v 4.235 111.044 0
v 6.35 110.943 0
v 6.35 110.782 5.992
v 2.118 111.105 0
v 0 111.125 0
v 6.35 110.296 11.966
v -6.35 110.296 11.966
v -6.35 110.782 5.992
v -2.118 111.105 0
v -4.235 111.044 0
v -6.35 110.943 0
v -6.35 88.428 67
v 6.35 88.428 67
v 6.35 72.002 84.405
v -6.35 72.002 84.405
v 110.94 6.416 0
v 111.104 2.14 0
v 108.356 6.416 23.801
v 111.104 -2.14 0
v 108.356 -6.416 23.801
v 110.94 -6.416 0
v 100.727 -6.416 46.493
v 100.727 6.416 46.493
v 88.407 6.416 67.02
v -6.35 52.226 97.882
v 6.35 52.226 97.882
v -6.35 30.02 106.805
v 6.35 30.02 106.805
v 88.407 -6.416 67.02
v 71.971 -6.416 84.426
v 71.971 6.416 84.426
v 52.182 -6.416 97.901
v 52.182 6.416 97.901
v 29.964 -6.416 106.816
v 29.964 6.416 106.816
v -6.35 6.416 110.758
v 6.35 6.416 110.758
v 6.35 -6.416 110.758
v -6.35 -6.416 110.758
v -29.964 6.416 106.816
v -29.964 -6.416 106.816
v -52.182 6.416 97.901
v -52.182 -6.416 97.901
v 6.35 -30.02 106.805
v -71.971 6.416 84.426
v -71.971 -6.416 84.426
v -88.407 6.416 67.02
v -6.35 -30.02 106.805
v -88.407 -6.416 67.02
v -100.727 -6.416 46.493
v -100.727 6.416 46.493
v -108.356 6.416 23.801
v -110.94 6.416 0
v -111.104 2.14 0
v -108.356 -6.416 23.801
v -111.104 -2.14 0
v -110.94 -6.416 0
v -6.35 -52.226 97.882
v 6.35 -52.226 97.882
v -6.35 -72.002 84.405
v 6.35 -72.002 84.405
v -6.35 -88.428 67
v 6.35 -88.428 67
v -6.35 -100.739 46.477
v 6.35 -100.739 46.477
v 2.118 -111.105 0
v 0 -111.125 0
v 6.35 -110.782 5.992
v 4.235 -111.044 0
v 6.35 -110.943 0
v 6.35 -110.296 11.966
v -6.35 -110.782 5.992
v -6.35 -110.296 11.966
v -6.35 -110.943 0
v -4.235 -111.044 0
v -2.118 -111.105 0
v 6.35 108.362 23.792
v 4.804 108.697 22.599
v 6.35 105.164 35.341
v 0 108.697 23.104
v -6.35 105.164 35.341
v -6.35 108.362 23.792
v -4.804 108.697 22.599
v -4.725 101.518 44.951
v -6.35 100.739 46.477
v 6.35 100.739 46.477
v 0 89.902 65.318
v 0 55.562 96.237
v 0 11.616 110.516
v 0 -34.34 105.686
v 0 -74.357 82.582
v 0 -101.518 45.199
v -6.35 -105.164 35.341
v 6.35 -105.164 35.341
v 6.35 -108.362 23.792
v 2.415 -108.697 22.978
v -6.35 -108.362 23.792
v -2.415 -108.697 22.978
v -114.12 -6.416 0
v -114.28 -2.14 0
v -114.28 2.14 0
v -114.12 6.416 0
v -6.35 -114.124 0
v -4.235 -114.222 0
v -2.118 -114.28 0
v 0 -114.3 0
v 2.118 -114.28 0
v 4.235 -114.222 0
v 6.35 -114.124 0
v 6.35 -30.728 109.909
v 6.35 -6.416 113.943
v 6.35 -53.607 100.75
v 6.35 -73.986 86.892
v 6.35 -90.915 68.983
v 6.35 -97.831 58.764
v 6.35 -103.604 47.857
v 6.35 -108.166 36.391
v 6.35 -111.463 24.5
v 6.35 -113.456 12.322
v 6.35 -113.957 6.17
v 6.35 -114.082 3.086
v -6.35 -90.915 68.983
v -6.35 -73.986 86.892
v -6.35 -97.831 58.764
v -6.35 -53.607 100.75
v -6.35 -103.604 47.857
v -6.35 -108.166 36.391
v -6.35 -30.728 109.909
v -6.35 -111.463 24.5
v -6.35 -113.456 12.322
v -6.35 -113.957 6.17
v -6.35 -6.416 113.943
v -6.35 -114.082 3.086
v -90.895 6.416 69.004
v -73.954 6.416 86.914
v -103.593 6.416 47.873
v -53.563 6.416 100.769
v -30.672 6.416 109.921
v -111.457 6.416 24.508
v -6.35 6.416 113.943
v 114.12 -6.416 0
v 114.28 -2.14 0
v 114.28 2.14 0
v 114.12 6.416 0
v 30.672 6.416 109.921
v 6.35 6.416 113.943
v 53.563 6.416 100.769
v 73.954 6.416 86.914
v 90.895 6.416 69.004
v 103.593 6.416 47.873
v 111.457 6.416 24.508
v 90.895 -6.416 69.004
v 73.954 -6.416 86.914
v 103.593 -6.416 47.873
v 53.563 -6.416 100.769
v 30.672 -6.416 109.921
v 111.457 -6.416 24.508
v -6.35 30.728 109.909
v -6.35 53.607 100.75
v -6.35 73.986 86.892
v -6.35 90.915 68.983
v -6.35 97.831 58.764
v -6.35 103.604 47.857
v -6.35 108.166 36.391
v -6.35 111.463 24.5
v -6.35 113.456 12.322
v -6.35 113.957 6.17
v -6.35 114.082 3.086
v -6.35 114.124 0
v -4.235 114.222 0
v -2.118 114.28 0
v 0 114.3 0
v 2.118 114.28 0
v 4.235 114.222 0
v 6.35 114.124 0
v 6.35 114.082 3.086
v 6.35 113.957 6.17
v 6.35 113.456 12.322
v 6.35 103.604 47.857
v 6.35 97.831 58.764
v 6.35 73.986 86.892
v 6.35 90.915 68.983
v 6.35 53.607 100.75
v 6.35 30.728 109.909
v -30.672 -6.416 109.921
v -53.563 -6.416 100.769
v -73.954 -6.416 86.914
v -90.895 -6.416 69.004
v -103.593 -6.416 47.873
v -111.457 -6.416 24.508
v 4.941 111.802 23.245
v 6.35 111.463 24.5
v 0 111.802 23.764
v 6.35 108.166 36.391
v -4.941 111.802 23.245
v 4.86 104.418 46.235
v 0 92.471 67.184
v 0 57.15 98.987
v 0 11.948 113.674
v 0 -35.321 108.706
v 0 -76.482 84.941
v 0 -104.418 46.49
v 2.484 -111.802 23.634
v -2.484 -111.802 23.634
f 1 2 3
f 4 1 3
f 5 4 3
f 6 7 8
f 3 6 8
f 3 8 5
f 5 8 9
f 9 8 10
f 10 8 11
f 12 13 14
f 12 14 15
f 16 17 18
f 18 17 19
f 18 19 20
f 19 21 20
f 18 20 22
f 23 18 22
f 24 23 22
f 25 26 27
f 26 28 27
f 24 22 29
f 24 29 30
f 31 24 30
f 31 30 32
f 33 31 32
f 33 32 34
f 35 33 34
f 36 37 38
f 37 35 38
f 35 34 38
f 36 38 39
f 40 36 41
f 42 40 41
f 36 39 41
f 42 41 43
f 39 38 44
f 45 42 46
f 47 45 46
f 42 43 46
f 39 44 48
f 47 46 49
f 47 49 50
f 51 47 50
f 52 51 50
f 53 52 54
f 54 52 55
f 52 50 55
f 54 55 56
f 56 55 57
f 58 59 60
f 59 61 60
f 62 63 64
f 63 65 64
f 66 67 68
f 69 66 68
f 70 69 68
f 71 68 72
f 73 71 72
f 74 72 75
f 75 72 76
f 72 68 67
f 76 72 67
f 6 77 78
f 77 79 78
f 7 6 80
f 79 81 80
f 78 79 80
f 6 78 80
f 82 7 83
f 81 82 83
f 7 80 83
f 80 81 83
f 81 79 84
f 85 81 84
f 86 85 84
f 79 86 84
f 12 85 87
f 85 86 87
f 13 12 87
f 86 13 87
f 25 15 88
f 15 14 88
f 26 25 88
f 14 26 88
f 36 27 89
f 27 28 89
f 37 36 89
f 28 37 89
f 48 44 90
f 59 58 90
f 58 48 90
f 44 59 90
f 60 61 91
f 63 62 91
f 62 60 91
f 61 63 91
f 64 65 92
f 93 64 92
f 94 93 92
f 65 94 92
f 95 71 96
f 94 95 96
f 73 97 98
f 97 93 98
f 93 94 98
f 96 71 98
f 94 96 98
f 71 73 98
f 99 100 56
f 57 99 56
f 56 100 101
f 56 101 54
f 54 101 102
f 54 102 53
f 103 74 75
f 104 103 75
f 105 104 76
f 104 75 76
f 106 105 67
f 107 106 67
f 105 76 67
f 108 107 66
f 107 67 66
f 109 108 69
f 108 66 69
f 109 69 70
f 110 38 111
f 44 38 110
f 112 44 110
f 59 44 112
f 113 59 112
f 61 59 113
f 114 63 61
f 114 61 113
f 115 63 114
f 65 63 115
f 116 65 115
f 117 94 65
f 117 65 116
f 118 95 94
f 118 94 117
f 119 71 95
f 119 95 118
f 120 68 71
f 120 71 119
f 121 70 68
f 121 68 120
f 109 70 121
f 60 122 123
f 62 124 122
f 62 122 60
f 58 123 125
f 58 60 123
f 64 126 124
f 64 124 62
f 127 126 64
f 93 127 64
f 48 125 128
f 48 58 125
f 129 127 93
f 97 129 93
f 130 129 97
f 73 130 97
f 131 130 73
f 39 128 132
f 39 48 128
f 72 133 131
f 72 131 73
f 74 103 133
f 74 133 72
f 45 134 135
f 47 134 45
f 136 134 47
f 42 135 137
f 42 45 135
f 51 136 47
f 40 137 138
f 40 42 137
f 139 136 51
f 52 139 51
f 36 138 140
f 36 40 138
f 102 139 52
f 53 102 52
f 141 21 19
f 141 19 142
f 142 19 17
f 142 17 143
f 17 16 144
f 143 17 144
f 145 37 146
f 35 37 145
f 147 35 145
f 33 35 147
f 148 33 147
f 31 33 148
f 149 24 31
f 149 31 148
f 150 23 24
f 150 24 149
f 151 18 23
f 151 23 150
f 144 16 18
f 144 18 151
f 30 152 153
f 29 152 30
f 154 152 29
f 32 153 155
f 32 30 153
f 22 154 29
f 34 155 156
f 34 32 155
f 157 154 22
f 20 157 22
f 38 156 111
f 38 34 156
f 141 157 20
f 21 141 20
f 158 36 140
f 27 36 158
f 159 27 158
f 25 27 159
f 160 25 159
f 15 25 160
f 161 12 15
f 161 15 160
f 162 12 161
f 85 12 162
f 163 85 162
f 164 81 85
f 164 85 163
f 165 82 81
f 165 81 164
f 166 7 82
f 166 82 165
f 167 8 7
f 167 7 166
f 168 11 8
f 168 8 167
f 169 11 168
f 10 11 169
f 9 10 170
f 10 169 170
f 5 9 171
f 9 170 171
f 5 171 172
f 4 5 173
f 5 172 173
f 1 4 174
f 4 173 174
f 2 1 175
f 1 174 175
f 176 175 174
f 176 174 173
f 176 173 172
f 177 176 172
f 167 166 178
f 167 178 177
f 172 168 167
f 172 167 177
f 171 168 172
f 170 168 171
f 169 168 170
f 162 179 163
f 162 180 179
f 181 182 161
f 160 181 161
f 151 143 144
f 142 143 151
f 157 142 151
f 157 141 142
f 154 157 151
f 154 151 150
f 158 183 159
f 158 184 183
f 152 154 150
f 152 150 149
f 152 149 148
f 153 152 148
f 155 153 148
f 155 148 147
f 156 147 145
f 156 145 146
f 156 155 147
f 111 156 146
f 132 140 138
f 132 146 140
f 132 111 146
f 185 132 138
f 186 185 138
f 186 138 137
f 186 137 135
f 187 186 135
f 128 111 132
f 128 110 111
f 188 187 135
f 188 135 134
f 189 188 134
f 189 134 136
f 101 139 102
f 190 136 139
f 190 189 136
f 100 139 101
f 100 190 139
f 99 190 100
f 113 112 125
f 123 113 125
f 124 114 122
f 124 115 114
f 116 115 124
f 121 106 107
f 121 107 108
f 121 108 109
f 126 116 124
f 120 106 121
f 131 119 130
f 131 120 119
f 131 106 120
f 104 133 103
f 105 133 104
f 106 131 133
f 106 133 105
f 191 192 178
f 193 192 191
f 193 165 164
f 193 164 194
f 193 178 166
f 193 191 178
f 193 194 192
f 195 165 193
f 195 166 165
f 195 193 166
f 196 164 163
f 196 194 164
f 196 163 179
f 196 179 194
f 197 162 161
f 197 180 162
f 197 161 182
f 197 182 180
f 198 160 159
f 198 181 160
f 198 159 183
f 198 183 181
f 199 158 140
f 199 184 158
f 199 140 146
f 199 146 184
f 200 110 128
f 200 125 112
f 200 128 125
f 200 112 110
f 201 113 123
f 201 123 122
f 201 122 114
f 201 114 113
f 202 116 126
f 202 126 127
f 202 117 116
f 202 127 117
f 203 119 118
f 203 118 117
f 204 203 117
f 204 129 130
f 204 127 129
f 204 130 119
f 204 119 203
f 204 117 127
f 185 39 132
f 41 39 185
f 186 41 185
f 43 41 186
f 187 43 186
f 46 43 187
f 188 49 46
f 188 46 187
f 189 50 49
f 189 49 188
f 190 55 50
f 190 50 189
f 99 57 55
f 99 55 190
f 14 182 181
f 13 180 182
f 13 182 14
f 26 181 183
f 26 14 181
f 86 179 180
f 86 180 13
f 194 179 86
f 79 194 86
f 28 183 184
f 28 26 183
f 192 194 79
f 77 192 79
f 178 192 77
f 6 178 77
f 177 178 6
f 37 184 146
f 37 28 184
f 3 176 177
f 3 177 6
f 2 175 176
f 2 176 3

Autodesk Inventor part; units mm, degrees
ref_plane "YZ Plane" through (0, 0, 0) normal (1, 0, 0) x (0, 1, 0)
ref_plane "XZ Plane" through (0, 0, 0) normal (0, 1, 0) x (-1, 0, 0)
ref_plane "XY Plane" through (0, 0, 0) normal (0, 0, 1) x (1, 0, 0)
sketch "Sketch1" plane through (0, 0, 0) normal (0, 0, 1) x (1, 0, 0)
  line L0 (-137.16, 0) -> (22.86, 0) projected
  line L1 (0, -160.02) -> (0, 160.02) projected
  arc A0 (0, 114.3) -> (0, -114.3) centre (0, 0) ccw
  arc A1 (0, 111.125) -> (0, -111.125) centre (0, 0) ccw
  line L2 (0, 111.125) -> (0, 114.3)
  line L3 (0, -114.3) -> (0, -111.125)
  dimension "d6" = 3.175
  dimension "d7" = 228.6
revolve "Revolution1" add sketch "Sketch1" angle 180 about axis through (0, -10, 0) along (0, 1, 0) contours A0 L1 A1 L0 | L0 A1 L1 A0
sketch "Sketch2" plane through (0, 0, 0) normal (0, 0, -1) x (-1, 0, 0)
  circle A0 centre (0, 0) radius 114.3 projected
  line L0 (-6.35, 114.1235) -> (-6.35, 6.4165)
  line L1 (-6.35, 6.4165) -> (-114.1198, 6.4165)
  line L2 (160.02, 0) -> (-160.02, 0) projected
  line L3 (0, -160.02) -> (0, 160.02) projected
  line L4 (-114.3, 0.0665) -> (114.3, 0.0665) construction
  dimension "d2" = 6.35
  dimension "d3" = 6.35
extrude "Extrusion1" cut sketch "Sketch2" against normal through all contours L0 L1 A0
mirror "Mirror1" about plane through (0, 0, 0) normal (0, 1, 0) of "Extrusion1"
mirror "Mirror2" about plane through (0, 0, 0) normal (1, 0, 0) of "Extrusion1", "Mirror1"
properties part number "shell model"
